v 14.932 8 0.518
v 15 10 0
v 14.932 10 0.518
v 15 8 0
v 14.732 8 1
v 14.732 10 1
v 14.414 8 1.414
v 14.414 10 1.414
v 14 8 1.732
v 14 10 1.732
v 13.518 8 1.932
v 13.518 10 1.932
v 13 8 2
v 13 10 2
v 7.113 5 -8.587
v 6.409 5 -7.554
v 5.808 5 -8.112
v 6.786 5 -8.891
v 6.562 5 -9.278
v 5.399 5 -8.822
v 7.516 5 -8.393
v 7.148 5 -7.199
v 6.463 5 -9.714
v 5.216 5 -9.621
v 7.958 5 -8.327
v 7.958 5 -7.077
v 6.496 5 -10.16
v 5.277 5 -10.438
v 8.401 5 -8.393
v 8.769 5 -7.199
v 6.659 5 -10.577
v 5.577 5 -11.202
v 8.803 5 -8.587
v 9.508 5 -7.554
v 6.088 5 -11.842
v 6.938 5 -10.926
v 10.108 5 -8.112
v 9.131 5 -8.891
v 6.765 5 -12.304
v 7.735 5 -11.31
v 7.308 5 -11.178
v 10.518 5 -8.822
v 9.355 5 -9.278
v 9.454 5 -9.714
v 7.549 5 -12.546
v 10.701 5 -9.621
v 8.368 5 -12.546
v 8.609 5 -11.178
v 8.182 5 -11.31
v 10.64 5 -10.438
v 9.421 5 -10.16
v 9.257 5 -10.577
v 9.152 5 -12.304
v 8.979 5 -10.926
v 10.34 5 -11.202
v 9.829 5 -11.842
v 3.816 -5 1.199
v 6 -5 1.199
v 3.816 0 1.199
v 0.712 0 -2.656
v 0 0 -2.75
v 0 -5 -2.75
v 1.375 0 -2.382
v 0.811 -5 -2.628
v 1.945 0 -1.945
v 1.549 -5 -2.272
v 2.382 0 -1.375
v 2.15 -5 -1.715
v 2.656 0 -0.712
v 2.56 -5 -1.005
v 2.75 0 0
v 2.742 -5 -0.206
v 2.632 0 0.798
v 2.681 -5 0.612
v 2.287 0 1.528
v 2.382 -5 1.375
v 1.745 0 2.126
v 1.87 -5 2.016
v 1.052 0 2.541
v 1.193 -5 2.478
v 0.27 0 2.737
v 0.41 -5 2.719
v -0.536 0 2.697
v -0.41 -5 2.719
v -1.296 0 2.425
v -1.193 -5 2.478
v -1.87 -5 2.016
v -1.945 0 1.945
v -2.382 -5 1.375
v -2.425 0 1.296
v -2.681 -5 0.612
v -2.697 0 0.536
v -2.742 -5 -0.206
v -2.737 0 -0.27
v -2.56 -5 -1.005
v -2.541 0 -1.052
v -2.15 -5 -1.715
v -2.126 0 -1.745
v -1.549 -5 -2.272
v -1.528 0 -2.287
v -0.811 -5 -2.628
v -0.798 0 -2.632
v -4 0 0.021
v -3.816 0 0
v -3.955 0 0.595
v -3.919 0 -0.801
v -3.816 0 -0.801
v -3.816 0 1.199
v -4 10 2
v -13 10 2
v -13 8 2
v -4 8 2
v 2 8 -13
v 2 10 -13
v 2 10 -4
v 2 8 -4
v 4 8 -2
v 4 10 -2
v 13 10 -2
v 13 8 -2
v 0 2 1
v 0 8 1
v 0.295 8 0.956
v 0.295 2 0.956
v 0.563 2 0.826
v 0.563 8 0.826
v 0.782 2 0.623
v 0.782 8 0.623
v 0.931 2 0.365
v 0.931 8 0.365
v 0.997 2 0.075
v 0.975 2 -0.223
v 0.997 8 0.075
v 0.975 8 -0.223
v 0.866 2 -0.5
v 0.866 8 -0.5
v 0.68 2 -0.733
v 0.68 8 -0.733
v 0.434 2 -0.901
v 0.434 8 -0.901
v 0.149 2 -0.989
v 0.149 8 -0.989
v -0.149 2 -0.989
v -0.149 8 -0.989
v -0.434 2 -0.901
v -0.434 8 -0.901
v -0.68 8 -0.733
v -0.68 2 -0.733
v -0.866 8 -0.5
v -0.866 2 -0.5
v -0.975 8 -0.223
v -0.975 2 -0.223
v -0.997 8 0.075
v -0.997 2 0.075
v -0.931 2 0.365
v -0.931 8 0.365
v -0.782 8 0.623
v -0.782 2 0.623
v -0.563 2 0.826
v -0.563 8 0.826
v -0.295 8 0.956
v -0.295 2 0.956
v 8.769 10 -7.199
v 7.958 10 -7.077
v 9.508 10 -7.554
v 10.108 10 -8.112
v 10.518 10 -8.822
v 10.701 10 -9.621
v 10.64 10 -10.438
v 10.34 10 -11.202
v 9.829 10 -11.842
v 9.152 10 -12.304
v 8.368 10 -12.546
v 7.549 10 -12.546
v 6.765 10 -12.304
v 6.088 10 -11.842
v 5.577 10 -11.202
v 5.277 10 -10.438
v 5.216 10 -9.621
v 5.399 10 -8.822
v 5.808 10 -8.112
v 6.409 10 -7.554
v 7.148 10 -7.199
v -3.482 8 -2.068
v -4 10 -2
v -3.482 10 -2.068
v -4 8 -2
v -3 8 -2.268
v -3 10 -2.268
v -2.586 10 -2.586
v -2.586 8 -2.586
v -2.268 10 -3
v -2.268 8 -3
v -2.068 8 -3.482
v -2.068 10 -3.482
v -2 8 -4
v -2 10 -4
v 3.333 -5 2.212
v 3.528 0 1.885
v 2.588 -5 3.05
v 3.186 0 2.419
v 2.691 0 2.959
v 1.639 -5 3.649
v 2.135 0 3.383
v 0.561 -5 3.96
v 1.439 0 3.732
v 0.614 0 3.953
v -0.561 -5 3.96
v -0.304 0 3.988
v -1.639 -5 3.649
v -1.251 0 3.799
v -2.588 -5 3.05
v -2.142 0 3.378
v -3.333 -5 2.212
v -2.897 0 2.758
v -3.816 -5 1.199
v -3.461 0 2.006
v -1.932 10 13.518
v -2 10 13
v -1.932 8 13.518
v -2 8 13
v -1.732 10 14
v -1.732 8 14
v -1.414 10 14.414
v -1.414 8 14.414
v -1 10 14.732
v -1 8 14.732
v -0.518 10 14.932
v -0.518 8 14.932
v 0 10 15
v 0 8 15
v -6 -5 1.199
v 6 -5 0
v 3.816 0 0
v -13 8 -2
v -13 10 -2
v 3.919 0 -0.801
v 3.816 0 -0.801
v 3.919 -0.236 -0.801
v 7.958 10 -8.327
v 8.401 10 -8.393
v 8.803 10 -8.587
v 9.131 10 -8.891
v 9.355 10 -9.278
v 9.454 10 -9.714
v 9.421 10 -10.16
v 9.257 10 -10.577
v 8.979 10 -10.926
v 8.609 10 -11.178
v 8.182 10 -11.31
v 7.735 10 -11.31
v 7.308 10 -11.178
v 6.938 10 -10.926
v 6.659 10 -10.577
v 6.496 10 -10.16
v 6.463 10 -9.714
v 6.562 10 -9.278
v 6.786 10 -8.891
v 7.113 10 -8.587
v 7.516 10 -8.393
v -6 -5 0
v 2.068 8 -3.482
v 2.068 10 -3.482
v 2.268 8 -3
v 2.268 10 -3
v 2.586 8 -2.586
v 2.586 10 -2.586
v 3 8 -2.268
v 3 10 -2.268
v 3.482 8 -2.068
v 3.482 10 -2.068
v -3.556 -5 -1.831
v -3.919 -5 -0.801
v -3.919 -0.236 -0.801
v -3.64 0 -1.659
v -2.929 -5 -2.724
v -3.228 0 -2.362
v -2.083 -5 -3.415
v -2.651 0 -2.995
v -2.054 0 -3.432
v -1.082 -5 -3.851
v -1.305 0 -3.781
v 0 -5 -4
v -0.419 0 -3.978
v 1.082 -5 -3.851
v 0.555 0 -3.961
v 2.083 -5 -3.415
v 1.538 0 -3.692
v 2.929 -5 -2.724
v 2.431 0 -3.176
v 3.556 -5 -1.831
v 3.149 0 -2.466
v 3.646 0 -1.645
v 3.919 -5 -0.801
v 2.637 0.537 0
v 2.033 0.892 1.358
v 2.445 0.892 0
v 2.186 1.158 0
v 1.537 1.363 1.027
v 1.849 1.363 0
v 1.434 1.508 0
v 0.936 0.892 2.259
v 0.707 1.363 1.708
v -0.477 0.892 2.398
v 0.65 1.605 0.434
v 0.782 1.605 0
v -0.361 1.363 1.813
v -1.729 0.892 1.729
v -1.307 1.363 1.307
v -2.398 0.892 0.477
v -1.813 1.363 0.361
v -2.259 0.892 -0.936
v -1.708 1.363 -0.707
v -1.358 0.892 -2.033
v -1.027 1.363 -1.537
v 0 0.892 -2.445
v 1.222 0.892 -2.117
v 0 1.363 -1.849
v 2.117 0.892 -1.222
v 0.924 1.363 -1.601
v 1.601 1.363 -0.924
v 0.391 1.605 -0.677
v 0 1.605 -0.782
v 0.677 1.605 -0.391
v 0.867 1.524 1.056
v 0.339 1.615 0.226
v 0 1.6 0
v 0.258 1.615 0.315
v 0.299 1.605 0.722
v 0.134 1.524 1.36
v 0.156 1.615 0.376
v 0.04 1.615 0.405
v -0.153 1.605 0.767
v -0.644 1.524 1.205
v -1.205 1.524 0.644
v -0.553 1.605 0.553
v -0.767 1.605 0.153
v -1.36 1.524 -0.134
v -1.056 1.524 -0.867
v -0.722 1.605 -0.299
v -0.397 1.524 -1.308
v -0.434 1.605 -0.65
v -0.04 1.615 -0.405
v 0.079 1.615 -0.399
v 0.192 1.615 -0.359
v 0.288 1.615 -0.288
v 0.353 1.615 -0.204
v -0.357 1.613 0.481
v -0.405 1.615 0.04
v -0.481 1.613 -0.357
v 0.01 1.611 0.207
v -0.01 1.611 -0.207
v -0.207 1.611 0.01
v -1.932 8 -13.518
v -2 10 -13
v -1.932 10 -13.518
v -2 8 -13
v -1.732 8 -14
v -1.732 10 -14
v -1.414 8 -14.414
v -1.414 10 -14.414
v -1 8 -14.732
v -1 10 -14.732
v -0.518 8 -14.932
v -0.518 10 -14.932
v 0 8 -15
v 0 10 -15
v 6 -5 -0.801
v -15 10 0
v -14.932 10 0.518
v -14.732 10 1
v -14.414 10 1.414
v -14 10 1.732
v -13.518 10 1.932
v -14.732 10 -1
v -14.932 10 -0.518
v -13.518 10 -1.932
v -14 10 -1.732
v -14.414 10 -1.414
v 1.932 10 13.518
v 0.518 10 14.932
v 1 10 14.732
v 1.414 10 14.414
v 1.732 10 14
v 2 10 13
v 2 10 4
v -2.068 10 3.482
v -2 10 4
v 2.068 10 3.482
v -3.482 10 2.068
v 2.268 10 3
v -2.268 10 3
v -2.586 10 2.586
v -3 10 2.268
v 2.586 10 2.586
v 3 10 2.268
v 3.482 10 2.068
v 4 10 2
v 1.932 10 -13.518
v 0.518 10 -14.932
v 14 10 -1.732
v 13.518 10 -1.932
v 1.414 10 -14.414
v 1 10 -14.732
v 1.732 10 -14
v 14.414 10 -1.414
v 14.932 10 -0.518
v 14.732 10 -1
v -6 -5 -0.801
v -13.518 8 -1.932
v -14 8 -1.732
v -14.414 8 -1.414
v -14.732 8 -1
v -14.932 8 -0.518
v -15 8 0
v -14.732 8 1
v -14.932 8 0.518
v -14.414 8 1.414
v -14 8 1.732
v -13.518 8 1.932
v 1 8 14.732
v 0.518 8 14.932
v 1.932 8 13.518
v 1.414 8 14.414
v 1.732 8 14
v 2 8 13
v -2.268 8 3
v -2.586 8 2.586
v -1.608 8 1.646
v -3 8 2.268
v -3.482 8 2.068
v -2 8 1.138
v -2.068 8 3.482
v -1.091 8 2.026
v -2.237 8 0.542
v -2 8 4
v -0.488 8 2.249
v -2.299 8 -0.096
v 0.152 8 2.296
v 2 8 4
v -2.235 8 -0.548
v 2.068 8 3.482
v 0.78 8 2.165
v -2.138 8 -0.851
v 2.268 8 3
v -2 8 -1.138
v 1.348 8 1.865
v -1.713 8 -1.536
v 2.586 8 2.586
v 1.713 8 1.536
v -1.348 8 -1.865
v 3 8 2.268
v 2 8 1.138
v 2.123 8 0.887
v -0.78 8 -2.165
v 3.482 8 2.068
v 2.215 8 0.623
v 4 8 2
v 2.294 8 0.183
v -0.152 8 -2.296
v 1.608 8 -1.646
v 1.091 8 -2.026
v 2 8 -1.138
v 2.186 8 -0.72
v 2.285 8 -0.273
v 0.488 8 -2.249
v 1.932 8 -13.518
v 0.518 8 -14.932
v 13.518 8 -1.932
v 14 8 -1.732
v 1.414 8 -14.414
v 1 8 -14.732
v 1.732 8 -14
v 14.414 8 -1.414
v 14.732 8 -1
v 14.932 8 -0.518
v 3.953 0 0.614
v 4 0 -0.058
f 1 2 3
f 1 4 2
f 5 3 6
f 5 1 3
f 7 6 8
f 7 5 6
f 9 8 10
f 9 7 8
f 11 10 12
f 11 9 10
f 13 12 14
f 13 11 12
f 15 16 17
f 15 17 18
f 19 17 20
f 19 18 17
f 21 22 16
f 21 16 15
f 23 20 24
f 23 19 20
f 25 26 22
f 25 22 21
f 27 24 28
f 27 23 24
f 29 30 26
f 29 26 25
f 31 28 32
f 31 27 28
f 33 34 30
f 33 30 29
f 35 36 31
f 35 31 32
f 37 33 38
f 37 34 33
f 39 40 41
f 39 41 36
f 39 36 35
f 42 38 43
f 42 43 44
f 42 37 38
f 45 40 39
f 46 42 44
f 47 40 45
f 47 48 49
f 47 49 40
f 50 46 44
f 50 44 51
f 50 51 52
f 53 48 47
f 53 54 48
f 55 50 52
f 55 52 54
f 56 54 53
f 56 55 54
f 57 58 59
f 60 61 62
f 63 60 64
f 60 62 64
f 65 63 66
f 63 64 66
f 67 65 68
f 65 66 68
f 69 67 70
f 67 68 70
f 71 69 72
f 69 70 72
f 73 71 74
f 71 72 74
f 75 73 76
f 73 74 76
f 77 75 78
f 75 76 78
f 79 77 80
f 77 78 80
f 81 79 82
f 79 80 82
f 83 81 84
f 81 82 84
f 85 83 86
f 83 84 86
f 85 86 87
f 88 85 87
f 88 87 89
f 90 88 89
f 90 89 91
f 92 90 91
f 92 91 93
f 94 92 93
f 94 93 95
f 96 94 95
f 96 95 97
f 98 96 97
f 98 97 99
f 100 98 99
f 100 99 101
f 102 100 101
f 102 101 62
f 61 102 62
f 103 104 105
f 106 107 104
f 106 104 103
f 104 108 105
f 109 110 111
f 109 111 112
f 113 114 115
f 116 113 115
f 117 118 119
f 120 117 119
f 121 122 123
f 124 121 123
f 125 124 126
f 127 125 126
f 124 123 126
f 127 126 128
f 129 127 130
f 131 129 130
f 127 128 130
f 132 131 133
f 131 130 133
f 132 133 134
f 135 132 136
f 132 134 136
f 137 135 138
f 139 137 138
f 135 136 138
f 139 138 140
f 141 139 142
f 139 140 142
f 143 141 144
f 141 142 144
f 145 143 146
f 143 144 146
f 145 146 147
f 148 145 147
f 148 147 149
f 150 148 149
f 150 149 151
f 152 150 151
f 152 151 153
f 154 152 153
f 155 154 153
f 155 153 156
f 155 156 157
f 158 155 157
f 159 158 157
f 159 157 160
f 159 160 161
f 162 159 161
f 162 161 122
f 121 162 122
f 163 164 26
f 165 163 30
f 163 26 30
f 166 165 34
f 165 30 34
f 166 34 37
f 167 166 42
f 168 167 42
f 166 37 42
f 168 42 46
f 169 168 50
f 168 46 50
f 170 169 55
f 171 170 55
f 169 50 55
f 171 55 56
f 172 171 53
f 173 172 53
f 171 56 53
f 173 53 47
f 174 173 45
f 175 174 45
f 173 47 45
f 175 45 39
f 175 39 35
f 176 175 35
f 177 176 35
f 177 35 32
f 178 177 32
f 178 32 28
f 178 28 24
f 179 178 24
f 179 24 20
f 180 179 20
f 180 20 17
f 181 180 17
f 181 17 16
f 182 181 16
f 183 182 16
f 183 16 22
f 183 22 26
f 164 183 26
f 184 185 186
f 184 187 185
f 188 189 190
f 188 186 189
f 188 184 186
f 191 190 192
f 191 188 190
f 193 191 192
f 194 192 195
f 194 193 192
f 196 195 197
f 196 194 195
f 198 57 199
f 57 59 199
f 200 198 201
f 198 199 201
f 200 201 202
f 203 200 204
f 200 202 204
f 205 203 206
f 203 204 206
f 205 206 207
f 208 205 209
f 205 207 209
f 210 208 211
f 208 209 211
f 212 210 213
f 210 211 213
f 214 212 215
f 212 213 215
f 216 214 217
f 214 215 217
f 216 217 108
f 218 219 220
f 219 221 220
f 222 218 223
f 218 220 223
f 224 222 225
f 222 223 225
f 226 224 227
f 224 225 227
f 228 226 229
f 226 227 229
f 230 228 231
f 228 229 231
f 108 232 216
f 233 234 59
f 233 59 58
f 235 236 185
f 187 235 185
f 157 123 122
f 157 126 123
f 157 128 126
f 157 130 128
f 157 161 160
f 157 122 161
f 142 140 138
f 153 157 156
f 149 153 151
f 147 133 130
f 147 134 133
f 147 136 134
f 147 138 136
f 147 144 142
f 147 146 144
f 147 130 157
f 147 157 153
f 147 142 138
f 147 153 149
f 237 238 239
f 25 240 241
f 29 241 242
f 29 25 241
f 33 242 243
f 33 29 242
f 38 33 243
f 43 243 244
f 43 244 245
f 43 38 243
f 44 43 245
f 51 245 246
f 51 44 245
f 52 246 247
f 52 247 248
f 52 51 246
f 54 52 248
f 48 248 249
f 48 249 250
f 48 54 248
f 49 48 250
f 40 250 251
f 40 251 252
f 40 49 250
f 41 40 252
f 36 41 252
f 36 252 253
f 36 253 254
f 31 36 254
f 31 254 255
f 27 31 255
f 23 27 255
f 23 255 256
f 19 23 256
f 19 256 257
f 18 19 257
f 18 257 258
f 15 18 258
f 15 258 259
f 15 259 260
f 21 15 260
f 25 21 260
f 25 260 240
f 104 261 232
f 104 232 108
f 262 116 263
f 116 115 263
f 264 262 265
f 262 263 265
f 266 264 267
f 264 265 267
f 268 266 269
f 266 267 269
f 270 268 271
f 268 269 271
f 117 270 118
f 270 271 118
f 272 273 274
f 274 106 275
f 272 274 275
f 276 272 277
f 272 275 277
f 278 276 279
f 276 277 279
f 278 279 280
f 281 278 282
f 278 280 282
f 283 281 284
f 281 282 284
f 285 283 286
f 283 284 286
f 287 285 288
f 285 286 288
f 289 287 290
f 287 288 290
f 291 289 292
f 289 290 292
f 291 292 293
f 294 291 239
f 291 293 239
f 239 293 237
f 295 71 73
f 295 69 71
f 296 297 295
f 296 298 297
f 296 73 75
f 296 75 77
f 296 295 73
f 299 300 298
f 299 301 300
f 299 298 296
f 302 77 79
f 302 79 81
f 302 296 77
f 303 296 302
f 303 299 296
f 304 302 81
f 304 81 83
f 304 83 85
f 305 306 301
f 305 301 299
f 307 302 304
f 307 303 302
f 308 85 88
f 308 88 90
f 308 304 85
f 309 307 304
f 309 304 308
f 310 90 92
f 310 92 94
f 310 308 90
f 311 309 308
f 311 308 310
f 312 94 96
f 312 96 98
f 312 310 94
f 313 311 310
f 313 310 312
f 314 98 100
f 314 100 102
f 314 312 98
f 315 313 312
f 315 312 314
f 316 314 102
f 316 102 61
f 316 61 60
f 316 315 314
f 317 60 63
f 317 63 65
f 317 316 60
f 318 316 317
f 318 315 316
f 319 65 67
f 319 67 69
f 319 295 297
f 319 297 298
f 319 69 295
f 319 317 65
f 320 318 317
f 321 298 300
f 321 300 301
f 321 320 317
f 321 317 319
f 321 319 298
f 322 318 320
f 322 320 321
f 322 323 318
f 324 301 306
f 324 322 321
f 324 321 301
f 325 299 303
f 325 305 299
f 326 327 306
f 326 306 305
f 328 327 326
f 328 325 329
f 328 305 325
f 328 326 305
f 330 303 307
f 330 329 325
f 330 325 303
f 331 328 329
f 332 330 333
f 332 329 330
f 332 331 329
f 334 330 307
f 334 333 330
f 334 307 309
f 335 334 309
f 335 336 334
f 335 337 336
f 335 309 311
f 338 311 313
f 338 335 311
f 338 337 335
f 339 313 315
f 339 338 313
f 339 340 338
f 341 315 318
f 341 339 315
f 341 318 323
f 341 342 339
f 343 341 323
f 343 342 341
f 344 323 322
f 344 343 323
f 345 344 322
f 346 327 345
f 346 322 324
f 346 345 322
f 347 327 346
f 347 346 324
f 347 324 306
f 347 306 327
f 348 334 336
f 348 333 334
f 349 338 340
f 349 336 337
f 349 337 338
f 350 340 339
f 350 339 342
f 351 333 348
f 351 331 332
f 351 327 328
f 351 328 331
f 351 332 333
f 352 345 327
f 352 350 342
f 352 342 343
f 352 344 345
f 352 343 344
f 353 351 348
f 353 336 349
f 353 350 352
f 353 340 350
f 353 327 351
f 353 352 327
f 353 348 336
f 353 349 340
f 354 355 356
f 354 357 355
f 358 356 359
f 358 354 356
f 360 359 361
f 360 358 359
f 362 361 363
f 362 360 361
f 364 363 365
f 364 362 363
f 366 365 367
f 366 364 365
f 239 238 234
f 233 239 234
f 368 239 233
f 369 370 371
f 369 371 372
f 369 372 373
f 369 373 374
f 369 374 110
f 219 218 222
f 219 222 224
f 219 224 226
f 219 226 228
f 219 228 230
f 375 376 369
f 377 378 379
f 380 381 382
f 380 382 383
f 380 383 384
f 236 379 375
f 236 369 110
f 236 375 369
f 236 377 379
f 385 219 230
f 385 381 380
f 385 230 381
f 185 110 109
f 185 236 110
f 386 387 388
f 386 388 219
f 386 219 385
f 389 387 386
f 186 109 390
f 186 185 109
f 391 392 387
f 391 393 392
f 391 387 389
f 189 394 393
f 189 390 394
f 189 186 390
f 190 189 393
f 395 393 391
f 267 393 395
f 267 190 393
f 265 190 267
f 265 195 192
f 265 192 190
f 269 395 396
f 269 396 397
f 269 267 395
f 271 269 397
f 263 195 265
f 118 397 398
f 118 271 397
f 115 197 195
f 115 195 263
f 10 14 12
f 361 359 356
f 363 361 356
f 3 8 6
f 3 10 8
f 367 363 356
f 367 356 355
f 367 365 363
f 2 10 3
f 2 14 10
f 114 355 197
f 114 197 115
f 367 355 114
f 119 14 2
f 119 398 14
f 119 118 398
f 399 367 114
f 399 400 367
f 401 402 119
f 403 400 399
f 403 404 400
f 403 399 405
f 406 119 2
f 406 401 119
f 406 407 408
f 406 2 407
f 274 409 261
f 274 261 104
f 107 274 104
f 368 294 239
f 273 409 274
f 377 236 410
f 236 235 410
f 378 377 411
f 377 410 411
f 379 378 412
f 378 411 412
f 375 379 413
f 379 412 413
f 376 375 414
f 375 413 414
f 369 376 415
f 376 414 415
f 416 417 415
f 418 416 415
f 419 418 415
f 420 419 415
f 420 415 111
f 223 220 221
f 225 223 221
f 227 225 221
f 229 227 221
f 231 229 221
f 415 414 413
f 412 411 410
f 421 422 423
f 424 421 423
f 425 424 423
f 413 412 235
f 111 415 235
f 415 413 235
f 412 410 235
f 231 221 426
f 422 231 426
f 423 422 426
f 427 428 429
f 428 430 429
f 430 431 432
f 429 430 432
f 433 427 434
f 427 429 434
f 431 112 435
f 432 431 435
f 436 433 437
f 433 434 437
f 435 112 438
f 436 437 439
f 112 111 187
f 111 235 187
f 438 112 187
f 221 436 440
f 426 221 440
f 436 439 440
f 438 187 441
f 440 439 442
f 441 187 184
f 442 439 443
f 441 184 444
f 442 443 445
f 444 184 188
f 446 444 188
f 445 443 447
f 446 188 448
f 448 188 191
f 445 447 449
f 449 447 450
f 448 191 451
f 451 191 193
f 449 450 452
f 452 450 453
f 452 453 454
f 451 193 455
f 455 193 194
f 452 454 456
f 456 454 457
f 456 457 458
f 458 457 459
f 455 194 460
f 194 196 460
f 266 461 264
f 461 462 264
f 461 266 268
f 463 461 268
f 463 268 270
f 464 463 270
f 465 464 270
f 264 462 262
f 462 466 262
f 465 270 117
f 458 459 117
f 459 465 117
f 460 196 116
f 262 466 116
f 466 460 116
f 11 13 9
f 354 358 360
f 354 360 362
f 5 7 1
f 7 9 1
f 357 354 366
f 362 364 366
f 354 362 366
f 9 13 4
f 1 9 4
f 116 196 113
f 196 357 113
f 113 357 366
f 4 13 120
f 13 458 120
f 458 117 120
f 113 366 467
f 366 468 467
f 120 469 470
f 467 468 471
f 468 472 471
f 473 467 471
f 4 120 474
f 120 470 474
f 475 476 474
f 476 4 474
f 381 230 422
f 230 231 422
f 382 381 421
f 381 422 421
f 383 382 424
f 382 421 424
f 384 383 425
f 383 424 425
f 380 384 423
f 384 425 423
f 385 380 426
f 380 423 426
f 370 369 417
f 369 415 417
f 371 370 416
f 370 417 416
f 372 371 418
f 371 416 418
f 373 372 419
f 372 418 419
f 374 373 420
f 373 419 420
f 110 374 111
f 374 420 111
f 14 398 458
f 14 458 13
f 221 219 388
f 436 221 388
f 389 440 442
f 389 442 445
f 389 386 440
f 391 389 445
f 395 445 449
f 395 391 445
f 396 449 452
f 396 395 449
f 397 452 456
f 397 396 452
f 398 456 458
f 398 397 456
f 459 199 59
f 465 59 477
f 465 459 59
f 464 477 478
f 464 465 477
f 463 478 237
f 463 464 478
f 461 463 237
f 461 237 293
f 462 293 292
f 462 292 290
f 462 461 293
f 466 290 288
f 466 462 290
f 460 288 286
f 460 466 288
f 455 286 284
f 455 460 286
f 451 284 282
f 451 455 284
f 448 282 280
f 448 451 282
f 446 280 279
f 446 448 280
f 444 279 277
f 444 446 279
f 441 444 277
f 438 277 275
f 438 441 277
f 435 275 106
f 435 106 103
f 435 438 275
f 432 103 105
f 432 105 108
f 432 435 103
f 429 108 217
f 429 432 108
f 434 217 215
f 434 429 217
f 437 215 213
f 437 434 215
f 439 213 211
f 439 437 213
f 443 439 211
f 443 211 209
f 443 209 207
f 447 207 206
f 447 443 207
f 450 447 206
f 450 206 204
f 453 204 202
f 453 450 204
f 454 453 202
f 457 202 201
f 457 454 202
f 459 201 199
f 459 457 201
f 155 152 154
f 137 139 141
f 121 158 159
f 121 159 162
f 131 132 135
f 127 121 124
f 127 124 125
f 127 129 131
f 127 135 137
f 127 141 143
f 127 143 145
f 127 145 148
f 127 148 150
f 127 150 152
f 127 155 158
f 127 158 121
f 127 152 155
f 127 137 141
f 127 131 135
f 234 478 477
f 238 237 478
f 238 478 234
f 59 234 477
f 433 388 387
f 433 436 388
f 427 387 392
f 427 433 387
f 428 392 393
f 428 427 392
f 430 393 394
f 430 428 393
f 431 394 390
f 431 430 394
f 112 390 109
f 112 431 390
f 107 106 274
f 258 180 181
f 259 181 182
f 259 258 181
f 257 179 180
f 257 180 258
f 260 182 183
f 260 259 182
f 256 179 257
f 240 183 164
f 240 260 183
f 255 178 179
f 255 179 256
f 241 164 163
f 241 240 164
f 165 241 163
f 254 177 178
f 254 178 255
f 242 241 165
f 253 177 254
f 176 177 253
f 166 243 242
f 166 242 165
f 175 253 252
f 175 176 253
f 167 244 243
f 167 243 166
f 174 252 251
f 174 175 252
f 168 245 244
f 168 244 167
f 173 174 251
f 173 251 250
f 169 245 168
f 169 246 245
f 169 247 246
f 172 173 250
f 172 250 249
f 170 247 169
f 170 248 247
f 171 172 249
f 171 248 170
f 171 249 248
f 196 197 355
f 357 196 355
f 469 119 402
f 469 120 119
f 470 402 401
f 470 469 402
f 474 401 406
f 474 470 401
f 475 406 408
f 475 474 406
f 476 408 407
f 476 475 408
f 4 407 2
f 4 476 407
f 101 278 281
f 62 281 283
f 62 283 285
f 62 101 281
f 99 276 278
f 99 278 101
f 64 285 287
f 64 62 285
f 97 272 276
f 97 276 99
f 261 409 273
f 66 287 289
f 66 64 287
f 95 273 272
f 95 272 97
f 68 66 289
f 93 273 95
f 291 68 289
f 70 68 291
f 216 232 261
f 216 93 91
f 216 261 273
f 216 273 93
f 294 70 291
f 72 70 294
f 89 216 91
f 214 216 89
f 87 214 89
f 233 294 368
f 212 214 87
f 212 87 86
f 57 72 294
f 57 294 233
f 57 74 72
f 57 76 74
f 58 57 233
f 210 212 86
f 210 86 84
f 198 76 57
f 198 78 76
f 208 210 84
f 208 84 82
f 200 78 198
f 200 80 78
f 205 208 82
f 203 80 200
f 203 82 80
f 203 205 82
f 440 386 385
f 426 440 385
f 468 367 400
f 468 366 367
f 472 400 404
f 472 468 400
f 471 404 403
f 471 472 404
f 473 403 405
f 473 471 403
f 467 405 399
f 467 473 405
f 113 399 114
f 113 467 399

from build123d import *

# Parameters (mm, degrees)
SKETCH_1_R          = 2
EXTRUDE_2_DEPTH     = 10
SKETCH_4_R          = 1
CUT_EXTRUDE_1_DEPTH = 1.5
SKETCH_5_R          = 2.5500000000000007
CUT_EXTRUDE_2_DEPTH = 1.5
OTHER_4_OUTLINE_R   = 2.55
OTHER_4_DEPTH       = 1.5
SKETCH_9_R          = 4
SKETCH_9_R_2        = 2.5500000000000003
EXTRUDE_3_DEPTH     = 5
SKETCH_11_W         = 3.45
SKETCH_11_H         = 2
EXTRUDE_4_DEPTH     = 5
SKETCH_13_R         = 2.5499999999999994
SKETCH_13_R_2       = 1.3600000000000005
EXTRUDE_6_DEPTH     = 5
SKETCH_14_R         = 2.75
CUT_EXTRUDE_3_DEPTH = 5
SKETCH_17_R         = 1
CUT_EXTRUDE_4_DEPTH = 8
SKETCH_18_R         = 1.5000000000000004
CUT_EXTRUDE_5_DEPTH = 8
SKETCH_19_R         = 2.7499999999999982
SKETCH_19_R_2       = 2.549999999999999
EXTRUDE_7_DEPTH     = 5
SWEEP_4_DEPTH       = 1.199370755
EXTRUDE_8_DEPTH     = 2
SKETCH_26_W         = 30
SKETCH_26_H         = 4
EXTRUDE_9_DEPTH     = 2
FILLET_3_R          = 2
FILLET_4_R          = 2
SKETCH_28_R         = 2.7499999999999982
SKETCH_28_R_2       = 1.5000000000000002
EXTRUDE_10_DEPTH    = 10
SKETCH_29_R         = 2.749999999999998
SKETCH_29_R_2       = 1.5000000000000002
CUT_EXTRUDE_6_DEPTH = 5
SKETCH_30_R         = 3.4440131177468327
CUT_EXTRUDE_7_DEPTH = 5
FILLET_5_R          = 2
SKETCH_31_R         = 32.078168180335766
EXTRUDE_11_DEPTH    = 5
CUT_EXTRUDE_START   = -5
SKETCH_32_R         = 32.078168180335766
CUT_EXTRUDE_8_DEPTH = 5


with BuildPart() as part:
    # 草图1 → 凸台-拉伸2 (new body)
    with BuildSketch(Plane(origin=(0, 0, 0), x_dir=(1, 0, 0), z_dir=(0, 1, 0))):
        with Locations(Location((0, 0, 0), (0, 0, 270))):
            Circle(SKETCH_1_R)
    extrude(amount=EXTRUDE_2_DEPTH)

    # 放样1: read off the stored shape, not the designer's step
    # 放样1: loft between two sections, ruled curve by curve
    loft_1_from = [
        Edge.make_bspline([(3.527981201, 0, 1.885032797), (7.298046794, 0, -5.170929606), (0.242084392, 0, -8.940995199), (-3.527981201, 0, -1.885032797), (-7.298046794, 0, 5.170929606), (-0.242084392, 0, 8.940995199), (3.527981201, 0, 1.885032797)], [0, 0, 0, 0, 0.5, 0.5, 0.5, 1, 1, 1, 1], 3, [1, 0.333333333333333, 0.333333333333333, 1, 0.333333333333333, 0.333333333333333, 1]),
    ]
    loft_1_to = [
        Edge.make_bspline([(1.985312696, 10, -0.241936974), (1.501438748, 10, -4.212562366), (-2.469186644, 10, -3.728688418), (-1.985312696, 10, 0.241936974), (-1.501438748, 10, 4.212562366), (2.469186644, 10, 3.728688418), (1.985312696, 10, -0.241936974)], [0, 0, 0, 0, 0.5, 0.5, 0.5, 1, 1, 1, 1], 3, [1, 0.333333333333333, 0.333333333333333, 1, 0.333333333333333, 0.333333333333333, 1]),
    ]
    loft_1 = Solid(Shell([*[Face.make_surface_from_curves(loft_1_from[k], loft_1_to[k]) for k in range(1)], Face(Wire(loft_1_from)), Face(Wire(loft_1_to))]))
    add(loft_1)

    # 草图4 → 切除-拉伸1 (cut)
    with BuildSketch(Plane.XZ):
        with Locations(Location((0, 0, 0), (0, 0, 270))):
            Circle(SKETCH_4_R)
    extrude(amount=-CUT_EXTRUDE_1_DEPTH, mode=Mode.SUBTRACT)

    # 草图5 → 切除-拉伸2 (cut)
    with BuildSketch(Plane.XZ):
        with Locations(Location((0, 0, 0), (0, 0, 270))):
            Circle(SKETCH_5_R)
    extrude(amount=-CUT_EXTRUDE_2_DEPTH, mode=Mode.SUBTRACT)

    # 边界4: read off the stored shape, not the designer's step
    # 边界4 outline → 边界4 (add)
    with BuildSketch(Plane(origin=(0, 0, 0), x_dir=(1, 0, 0), z_dir=(0, 1, 0))):
        Circle(OTHER_4_OUTLINE_R)
    extrude(amount=OTHER_4_DEPTH)

    # 切除-扫描1: sweep along a path in 草图7
    with BuildLine(Plane.XZ) as sweep_1_path:
        CenterArc((0, 0), 2.5500000000000003, 0, 360)
    # 草图8 → 切除-扫描1 (sweep, cut)
    with BuildSketch(Plane.XY):
        with BuildLine():
            Line((0, 1.5), (0, 0))
            Line((0, 0), (2.55, 0))
            add(Edge.make_bspline(
                [(2.55, 0), (2.066182344596684, 1.6092270378331606), (0, 1.5)],
                knots=[0, 0, 0, 1, 1, 1], degree=2))
        make_face()
    sweep(path=sweep_1_path.line, mode=Mode.SUBTRACT)

    # 草图9 → 凸台-拉伸3 (add)
    with BuildSketch(Plane.XZ):
        with Locations(Location((0, 0, 0), (0, 0, 28.116))):
            Circle(SKETCH_9_R)
        with Locations(Location((0, 0, 0), (0, 0, 90))):
            Circle(SKETCH_9_R_2, mode=Mode.SUBTRACT)
    extrude(amount=EXTRUDE_3_DEPTH)

    # 草图11 → 凸台-拉伸4 (add)
    with BuildSketch(Plane.XZ.offset(5)):
        Polygon((2.55, 1.199370755069412), (2.5500000000000003, -0.8006292449305884), (6, -0.8006292449305882), (6, 1.199370755069412), align=None)
        with Locations((-4.275, 0.19937075506941165)):
            Rectangle(SKETCH_11_W, SKETCH_11_H)
    extrude(amount=-EXTRUDE_4_DEPTH)

    # 草图14 → 切除-拉伸3 (cut)
    with BuildSketch(Plane.XZ.offset(5)):
        with Locations(Location((0, 0, 0), (0, 0, 270))):
            Circle(SKETCH_14_R)
    extrude(amount=-CUT_EXTRUDE_3_DEPTH, mode=Mode.SUBTRACT)

    # 切除-扫描2: sweep along a path in 草图16
    with BuildLine(Plane.XZ) as sweep_2_path:
        CenterArc((0, 0), 2.75, 0, 360)
    # 草图15 → 切除-扫描2 (sweep, cut)
    with BuildSketch(Plane.XY):
        with BuildLine():
            Line((0, 0), (2.75, 0))
            add(Edge.make_bspline(
                [(2.75, 0), (2.6198492058143814, 1.7714522282796645), (0, 1.6)],
                knots=[0, 0, 0, 1, 1, 1], degree=2))
            Line((0, 1.6), (0, 0))
        make_face()
    sweep(path=sweep_2_path.line, mode=Mode.SUBTRACT)

    # 草图17 → 切除-拉伸4 (cut)
    with BuildSketch(Plane(origin=(0, 10, 0), x_dir=(1, 0, 0), z_dir=(0, 1, 0))):
        with Locations(Location((0, 0, 0), (0, 0, 270))):
            Circle(SKETCH_17_R)
    extrude(amount=-CUT_EXTRUDE_4_DEPTH, mode=Mode.SUBTRACT)

    # 切除-扫描4: read off the stored shape, not the designer's step
    # 切除-扫描4 outline → 切除-扫描4 (cut)
    with BuildSketch(Plane.XY):
        Polygon((6, 0), (3.815954637, 0), (6, -5), align=None)
        Polygon((-3.815954637, 0), (-6, 0), (-6, -5), align=None)
    extrude(amount=SWEEP_4_DEPTH, mode=Mode.SUBTRACT)

    # 切除-扫描5: sweep along a path in 草图24
    with BuildLine(Plane(origin=(6, 0, 0), x_dir=(0, 0, -1), z_dir=(1, 0, 0))) as sweep_5_path:
        Line((0, -5), (0.8006292449305882, -5))
    # 草图23 → 切除-扫描5 (sweep, cut)
    with BuildSketch(Plane.XY):
        Polygon((3.8159546370317634, 0), (6, 0), (6, -5), align=None)
        Polygon((-3.8159546370317634, 0), (-6, -5), (-6, 0), align=None)
    sweep(path=sweep_5_path.line, mode=Mode.SUBTRACT)

    # 草图25 → 凸台-拉伸8 (add)
    with BuildSketch(Plane(origin=(0, 10, 0), x_dir=(1, 0, 0), z_dir=(0, 1, 0))):
        Polygon((-2.0000000000000027, 15.000000000000004), (1.9999999999999973, 15.000000000000004), (2.000000000000001, -14.999999999999996), (-1.9999999999999991, -14.999999999999996), align=None)
    extrude(amount=-EXTRUDE_8_DEPTH)

    # 草图26 → 凸台-拉伸9 (add)
    with BuildSketch(Plane(origin=(0, 10, 0), x_dir=(1, 0, 0), z_dir=(0, 1, 0))):
        Rectangle(SKETCH_26_W, SKETCH_26_H)
    extrude(amount=-EXTRUDE_9_DEPTH)

    # 圆角3
    fillet_3_edges = [part.edges().sort_by_distance(p)[0] for p in [
        (-2.000000000000001, 9, 2),
    ]]
    fillet(fillet_3_edges, radius=FILLET_3_R)

    # 圆角4
    fillet_4_edges = [part.edges().sort_by_distance(p)[0] for p in [
        (1.9999999999999987, 9, 2),
        (-2.0000000000000018, 9, -1.9999999999999998),
        (1.9999999999999987, 9, -1.9999999999999998),
    ]]
    fillet(fillet_4_edges, radius=FILLET_4_R)

    # 圆角5
    fillet_5_edges = [part.edges().sort_by_distance(p)[0] for p in [
        (1.9999999999999973, 9, -15.000000000000004),
        (-2.0000000000000027, 9, -15.000000000000004),
        (-14.999999999999998, 9, -1.9999999999999996),
        (-14.999999999999998, 9, 2.0000000000000004),
        (-1.9999999999999991, 9, 14.999999999999996),
        (2.000000000000001, 9, 14.999999999999996),
        (15.000000000000002, 9, 2.0000000000000004),
        (15.000000000000002, 9, -1.9999999999999996),
    ]]
    fillet(fillet_5_edges, radius=FILLET_5_R - 0.0001)  # a hair under: the kernel refuses the full size



with BuildPart() as body_2:
    # 草图13 → 凸台-拉伸6 (new body)
    with BuildSketch(Plane.XZ.offset(5)):
        with Locations(Location((13.780391227088217, 0, 0), (0, 0, 270))):
            Circle(SKETCH_13_R)
        with Locations(Location((13.780391227088217, 0, 0), (0, 0, 270))):
            Circle(SKETCH_13_R_2, mode=Mode.SUBTRACT)
    extrude(amount=-EXTRUDE_6_DEPTH)

    # 草图18 → 切除-拉伸5 (cut)
    with BuildSketch(Plane.XZ.offset(5)):
        with Locations(Location((13.780391227088217, 0, 0), (0, 0, 270))):
            Circle(SKETCH_18_R)
    extrude(amount=-CUT_EXTRUDE_5_DEPTH, mode=Mode.SUBTRACT)

    # 草图19 → 凸台-拉伸7 (add)
    with BuildSketch(Plane.XZ.offset(5)):
        with Locations(Location((13.780391227088217, 0, 0), (0, 0, 270))):
            Circle(SKETCH_19_R)
        with Locations((13.780391227088217, 0)):
            Circle(SKETCH_19_R_2, mode=Mode.SUBTRACT)
    extrude(amount=-EXTRUDE_7_DEPTH)

    # 草图30 → 切除-拉伸7 (cut)
    with BuildSketch(Plane.XZ.offset(5)):
        with Locations((13.780391227088217, 0)):
            Circle(SKETCH_30_R)
    extrude(amount=-CUT_EXTRUDE_7_DEPTH, mode=Mode.SUBTRACT)


with BuildPart() as body_3:
    # 草图28 → 凸台-拉伸10 (new body)
    with BuildSketch(Plane(origin=(0, 0, 0), x_dir=(1, 0, 0), z_dir=(0, 1, 0))):
        with Locations(Location((7.958455223865325, 9.826506431956656, 0), (0, 0, 270))):
            Circle(SKETCH_28_R)
        with Locations(Location((7.958455223865325, 9.826506431956656, 0), (0, 0, 270))):
            Circle(SKETCH_28_R_2, mode=Mode.SUBTRACT)
    extrude(amount=EXTRUDE_10_DEPTH)

    # 草图29 → 切除-拉伸6 (cut)
    with BuildSketch(Plane.XZ):
        with Locations(Location((7.958455223865325, -9.826506431956656, 0), (0, 0, 270))):
            Circle(SKETCH_29_R)
        with Locations(Location((7.958455223865325, -9.826506431956656, 0), (0, 0, 270))):
            Circle(SKETCH_29_R_2, mode=Mode.SUBTRACT)
    extrude(amount=-CUT_EXTRUDE_6_DEPTH, mode=Mode.SUBTRACT)


with BuildPart() as part_1:
    add(part.part)

    add(body_3.part)  # 凸台-拉伸11 merges body 3
    # 草图31 → 凸台-拉伸11 (add)
    with BuildSketch(Plane(origin=(0, 10, 0), x_dir=(1, 0, 0), z_dir=(0, 1, 0))):
        with Locations(Location((22.852661554417406, 23.157739017835205, 0), (0, 0, 218.644756535))):
            Circle(SKETCH_31_R)
    extrude(amount=EXTRUDE_11_DEPTH)

    # 草图32 → 切除-拉伸8 (cut)
    with BuildSketch(Plane(origin=(0, 15, 0), x_dir=(1, 0, 0), z_dir=(0, 1, 0)).offset(CUT_EXTRUDE_START)):
        with Locations((22.852661554417406, 23.157739017835205)):
            Circle(SKETCH_32_R)
    extrude(amount=CUT_EXTRUDE_8_DEPTH, mode=Mode.SUBTRACT)


with BuildPart() as cut_extrude_8_piece_1:
    # of the separate pieces the step leaves, piece 1, a body of its own (cut_extrude_8_pieces)
    add(part_1.part.solids().sort_by_distance((2, 8, 13.0001))[0])


with BuildPart() as cut_extrude_8_piece_2:
    # of the separate pieces the step leaves, piece 2, a body of its own (cut_extrude_8_pieces)
    add(part_1.part.solids().sort_by_distance((7.958455224, 5, -7.076506432))[0])


solid = Compound([cut_extrude_8_piece_1.part, cut_extrude_8_piece_2.part])
